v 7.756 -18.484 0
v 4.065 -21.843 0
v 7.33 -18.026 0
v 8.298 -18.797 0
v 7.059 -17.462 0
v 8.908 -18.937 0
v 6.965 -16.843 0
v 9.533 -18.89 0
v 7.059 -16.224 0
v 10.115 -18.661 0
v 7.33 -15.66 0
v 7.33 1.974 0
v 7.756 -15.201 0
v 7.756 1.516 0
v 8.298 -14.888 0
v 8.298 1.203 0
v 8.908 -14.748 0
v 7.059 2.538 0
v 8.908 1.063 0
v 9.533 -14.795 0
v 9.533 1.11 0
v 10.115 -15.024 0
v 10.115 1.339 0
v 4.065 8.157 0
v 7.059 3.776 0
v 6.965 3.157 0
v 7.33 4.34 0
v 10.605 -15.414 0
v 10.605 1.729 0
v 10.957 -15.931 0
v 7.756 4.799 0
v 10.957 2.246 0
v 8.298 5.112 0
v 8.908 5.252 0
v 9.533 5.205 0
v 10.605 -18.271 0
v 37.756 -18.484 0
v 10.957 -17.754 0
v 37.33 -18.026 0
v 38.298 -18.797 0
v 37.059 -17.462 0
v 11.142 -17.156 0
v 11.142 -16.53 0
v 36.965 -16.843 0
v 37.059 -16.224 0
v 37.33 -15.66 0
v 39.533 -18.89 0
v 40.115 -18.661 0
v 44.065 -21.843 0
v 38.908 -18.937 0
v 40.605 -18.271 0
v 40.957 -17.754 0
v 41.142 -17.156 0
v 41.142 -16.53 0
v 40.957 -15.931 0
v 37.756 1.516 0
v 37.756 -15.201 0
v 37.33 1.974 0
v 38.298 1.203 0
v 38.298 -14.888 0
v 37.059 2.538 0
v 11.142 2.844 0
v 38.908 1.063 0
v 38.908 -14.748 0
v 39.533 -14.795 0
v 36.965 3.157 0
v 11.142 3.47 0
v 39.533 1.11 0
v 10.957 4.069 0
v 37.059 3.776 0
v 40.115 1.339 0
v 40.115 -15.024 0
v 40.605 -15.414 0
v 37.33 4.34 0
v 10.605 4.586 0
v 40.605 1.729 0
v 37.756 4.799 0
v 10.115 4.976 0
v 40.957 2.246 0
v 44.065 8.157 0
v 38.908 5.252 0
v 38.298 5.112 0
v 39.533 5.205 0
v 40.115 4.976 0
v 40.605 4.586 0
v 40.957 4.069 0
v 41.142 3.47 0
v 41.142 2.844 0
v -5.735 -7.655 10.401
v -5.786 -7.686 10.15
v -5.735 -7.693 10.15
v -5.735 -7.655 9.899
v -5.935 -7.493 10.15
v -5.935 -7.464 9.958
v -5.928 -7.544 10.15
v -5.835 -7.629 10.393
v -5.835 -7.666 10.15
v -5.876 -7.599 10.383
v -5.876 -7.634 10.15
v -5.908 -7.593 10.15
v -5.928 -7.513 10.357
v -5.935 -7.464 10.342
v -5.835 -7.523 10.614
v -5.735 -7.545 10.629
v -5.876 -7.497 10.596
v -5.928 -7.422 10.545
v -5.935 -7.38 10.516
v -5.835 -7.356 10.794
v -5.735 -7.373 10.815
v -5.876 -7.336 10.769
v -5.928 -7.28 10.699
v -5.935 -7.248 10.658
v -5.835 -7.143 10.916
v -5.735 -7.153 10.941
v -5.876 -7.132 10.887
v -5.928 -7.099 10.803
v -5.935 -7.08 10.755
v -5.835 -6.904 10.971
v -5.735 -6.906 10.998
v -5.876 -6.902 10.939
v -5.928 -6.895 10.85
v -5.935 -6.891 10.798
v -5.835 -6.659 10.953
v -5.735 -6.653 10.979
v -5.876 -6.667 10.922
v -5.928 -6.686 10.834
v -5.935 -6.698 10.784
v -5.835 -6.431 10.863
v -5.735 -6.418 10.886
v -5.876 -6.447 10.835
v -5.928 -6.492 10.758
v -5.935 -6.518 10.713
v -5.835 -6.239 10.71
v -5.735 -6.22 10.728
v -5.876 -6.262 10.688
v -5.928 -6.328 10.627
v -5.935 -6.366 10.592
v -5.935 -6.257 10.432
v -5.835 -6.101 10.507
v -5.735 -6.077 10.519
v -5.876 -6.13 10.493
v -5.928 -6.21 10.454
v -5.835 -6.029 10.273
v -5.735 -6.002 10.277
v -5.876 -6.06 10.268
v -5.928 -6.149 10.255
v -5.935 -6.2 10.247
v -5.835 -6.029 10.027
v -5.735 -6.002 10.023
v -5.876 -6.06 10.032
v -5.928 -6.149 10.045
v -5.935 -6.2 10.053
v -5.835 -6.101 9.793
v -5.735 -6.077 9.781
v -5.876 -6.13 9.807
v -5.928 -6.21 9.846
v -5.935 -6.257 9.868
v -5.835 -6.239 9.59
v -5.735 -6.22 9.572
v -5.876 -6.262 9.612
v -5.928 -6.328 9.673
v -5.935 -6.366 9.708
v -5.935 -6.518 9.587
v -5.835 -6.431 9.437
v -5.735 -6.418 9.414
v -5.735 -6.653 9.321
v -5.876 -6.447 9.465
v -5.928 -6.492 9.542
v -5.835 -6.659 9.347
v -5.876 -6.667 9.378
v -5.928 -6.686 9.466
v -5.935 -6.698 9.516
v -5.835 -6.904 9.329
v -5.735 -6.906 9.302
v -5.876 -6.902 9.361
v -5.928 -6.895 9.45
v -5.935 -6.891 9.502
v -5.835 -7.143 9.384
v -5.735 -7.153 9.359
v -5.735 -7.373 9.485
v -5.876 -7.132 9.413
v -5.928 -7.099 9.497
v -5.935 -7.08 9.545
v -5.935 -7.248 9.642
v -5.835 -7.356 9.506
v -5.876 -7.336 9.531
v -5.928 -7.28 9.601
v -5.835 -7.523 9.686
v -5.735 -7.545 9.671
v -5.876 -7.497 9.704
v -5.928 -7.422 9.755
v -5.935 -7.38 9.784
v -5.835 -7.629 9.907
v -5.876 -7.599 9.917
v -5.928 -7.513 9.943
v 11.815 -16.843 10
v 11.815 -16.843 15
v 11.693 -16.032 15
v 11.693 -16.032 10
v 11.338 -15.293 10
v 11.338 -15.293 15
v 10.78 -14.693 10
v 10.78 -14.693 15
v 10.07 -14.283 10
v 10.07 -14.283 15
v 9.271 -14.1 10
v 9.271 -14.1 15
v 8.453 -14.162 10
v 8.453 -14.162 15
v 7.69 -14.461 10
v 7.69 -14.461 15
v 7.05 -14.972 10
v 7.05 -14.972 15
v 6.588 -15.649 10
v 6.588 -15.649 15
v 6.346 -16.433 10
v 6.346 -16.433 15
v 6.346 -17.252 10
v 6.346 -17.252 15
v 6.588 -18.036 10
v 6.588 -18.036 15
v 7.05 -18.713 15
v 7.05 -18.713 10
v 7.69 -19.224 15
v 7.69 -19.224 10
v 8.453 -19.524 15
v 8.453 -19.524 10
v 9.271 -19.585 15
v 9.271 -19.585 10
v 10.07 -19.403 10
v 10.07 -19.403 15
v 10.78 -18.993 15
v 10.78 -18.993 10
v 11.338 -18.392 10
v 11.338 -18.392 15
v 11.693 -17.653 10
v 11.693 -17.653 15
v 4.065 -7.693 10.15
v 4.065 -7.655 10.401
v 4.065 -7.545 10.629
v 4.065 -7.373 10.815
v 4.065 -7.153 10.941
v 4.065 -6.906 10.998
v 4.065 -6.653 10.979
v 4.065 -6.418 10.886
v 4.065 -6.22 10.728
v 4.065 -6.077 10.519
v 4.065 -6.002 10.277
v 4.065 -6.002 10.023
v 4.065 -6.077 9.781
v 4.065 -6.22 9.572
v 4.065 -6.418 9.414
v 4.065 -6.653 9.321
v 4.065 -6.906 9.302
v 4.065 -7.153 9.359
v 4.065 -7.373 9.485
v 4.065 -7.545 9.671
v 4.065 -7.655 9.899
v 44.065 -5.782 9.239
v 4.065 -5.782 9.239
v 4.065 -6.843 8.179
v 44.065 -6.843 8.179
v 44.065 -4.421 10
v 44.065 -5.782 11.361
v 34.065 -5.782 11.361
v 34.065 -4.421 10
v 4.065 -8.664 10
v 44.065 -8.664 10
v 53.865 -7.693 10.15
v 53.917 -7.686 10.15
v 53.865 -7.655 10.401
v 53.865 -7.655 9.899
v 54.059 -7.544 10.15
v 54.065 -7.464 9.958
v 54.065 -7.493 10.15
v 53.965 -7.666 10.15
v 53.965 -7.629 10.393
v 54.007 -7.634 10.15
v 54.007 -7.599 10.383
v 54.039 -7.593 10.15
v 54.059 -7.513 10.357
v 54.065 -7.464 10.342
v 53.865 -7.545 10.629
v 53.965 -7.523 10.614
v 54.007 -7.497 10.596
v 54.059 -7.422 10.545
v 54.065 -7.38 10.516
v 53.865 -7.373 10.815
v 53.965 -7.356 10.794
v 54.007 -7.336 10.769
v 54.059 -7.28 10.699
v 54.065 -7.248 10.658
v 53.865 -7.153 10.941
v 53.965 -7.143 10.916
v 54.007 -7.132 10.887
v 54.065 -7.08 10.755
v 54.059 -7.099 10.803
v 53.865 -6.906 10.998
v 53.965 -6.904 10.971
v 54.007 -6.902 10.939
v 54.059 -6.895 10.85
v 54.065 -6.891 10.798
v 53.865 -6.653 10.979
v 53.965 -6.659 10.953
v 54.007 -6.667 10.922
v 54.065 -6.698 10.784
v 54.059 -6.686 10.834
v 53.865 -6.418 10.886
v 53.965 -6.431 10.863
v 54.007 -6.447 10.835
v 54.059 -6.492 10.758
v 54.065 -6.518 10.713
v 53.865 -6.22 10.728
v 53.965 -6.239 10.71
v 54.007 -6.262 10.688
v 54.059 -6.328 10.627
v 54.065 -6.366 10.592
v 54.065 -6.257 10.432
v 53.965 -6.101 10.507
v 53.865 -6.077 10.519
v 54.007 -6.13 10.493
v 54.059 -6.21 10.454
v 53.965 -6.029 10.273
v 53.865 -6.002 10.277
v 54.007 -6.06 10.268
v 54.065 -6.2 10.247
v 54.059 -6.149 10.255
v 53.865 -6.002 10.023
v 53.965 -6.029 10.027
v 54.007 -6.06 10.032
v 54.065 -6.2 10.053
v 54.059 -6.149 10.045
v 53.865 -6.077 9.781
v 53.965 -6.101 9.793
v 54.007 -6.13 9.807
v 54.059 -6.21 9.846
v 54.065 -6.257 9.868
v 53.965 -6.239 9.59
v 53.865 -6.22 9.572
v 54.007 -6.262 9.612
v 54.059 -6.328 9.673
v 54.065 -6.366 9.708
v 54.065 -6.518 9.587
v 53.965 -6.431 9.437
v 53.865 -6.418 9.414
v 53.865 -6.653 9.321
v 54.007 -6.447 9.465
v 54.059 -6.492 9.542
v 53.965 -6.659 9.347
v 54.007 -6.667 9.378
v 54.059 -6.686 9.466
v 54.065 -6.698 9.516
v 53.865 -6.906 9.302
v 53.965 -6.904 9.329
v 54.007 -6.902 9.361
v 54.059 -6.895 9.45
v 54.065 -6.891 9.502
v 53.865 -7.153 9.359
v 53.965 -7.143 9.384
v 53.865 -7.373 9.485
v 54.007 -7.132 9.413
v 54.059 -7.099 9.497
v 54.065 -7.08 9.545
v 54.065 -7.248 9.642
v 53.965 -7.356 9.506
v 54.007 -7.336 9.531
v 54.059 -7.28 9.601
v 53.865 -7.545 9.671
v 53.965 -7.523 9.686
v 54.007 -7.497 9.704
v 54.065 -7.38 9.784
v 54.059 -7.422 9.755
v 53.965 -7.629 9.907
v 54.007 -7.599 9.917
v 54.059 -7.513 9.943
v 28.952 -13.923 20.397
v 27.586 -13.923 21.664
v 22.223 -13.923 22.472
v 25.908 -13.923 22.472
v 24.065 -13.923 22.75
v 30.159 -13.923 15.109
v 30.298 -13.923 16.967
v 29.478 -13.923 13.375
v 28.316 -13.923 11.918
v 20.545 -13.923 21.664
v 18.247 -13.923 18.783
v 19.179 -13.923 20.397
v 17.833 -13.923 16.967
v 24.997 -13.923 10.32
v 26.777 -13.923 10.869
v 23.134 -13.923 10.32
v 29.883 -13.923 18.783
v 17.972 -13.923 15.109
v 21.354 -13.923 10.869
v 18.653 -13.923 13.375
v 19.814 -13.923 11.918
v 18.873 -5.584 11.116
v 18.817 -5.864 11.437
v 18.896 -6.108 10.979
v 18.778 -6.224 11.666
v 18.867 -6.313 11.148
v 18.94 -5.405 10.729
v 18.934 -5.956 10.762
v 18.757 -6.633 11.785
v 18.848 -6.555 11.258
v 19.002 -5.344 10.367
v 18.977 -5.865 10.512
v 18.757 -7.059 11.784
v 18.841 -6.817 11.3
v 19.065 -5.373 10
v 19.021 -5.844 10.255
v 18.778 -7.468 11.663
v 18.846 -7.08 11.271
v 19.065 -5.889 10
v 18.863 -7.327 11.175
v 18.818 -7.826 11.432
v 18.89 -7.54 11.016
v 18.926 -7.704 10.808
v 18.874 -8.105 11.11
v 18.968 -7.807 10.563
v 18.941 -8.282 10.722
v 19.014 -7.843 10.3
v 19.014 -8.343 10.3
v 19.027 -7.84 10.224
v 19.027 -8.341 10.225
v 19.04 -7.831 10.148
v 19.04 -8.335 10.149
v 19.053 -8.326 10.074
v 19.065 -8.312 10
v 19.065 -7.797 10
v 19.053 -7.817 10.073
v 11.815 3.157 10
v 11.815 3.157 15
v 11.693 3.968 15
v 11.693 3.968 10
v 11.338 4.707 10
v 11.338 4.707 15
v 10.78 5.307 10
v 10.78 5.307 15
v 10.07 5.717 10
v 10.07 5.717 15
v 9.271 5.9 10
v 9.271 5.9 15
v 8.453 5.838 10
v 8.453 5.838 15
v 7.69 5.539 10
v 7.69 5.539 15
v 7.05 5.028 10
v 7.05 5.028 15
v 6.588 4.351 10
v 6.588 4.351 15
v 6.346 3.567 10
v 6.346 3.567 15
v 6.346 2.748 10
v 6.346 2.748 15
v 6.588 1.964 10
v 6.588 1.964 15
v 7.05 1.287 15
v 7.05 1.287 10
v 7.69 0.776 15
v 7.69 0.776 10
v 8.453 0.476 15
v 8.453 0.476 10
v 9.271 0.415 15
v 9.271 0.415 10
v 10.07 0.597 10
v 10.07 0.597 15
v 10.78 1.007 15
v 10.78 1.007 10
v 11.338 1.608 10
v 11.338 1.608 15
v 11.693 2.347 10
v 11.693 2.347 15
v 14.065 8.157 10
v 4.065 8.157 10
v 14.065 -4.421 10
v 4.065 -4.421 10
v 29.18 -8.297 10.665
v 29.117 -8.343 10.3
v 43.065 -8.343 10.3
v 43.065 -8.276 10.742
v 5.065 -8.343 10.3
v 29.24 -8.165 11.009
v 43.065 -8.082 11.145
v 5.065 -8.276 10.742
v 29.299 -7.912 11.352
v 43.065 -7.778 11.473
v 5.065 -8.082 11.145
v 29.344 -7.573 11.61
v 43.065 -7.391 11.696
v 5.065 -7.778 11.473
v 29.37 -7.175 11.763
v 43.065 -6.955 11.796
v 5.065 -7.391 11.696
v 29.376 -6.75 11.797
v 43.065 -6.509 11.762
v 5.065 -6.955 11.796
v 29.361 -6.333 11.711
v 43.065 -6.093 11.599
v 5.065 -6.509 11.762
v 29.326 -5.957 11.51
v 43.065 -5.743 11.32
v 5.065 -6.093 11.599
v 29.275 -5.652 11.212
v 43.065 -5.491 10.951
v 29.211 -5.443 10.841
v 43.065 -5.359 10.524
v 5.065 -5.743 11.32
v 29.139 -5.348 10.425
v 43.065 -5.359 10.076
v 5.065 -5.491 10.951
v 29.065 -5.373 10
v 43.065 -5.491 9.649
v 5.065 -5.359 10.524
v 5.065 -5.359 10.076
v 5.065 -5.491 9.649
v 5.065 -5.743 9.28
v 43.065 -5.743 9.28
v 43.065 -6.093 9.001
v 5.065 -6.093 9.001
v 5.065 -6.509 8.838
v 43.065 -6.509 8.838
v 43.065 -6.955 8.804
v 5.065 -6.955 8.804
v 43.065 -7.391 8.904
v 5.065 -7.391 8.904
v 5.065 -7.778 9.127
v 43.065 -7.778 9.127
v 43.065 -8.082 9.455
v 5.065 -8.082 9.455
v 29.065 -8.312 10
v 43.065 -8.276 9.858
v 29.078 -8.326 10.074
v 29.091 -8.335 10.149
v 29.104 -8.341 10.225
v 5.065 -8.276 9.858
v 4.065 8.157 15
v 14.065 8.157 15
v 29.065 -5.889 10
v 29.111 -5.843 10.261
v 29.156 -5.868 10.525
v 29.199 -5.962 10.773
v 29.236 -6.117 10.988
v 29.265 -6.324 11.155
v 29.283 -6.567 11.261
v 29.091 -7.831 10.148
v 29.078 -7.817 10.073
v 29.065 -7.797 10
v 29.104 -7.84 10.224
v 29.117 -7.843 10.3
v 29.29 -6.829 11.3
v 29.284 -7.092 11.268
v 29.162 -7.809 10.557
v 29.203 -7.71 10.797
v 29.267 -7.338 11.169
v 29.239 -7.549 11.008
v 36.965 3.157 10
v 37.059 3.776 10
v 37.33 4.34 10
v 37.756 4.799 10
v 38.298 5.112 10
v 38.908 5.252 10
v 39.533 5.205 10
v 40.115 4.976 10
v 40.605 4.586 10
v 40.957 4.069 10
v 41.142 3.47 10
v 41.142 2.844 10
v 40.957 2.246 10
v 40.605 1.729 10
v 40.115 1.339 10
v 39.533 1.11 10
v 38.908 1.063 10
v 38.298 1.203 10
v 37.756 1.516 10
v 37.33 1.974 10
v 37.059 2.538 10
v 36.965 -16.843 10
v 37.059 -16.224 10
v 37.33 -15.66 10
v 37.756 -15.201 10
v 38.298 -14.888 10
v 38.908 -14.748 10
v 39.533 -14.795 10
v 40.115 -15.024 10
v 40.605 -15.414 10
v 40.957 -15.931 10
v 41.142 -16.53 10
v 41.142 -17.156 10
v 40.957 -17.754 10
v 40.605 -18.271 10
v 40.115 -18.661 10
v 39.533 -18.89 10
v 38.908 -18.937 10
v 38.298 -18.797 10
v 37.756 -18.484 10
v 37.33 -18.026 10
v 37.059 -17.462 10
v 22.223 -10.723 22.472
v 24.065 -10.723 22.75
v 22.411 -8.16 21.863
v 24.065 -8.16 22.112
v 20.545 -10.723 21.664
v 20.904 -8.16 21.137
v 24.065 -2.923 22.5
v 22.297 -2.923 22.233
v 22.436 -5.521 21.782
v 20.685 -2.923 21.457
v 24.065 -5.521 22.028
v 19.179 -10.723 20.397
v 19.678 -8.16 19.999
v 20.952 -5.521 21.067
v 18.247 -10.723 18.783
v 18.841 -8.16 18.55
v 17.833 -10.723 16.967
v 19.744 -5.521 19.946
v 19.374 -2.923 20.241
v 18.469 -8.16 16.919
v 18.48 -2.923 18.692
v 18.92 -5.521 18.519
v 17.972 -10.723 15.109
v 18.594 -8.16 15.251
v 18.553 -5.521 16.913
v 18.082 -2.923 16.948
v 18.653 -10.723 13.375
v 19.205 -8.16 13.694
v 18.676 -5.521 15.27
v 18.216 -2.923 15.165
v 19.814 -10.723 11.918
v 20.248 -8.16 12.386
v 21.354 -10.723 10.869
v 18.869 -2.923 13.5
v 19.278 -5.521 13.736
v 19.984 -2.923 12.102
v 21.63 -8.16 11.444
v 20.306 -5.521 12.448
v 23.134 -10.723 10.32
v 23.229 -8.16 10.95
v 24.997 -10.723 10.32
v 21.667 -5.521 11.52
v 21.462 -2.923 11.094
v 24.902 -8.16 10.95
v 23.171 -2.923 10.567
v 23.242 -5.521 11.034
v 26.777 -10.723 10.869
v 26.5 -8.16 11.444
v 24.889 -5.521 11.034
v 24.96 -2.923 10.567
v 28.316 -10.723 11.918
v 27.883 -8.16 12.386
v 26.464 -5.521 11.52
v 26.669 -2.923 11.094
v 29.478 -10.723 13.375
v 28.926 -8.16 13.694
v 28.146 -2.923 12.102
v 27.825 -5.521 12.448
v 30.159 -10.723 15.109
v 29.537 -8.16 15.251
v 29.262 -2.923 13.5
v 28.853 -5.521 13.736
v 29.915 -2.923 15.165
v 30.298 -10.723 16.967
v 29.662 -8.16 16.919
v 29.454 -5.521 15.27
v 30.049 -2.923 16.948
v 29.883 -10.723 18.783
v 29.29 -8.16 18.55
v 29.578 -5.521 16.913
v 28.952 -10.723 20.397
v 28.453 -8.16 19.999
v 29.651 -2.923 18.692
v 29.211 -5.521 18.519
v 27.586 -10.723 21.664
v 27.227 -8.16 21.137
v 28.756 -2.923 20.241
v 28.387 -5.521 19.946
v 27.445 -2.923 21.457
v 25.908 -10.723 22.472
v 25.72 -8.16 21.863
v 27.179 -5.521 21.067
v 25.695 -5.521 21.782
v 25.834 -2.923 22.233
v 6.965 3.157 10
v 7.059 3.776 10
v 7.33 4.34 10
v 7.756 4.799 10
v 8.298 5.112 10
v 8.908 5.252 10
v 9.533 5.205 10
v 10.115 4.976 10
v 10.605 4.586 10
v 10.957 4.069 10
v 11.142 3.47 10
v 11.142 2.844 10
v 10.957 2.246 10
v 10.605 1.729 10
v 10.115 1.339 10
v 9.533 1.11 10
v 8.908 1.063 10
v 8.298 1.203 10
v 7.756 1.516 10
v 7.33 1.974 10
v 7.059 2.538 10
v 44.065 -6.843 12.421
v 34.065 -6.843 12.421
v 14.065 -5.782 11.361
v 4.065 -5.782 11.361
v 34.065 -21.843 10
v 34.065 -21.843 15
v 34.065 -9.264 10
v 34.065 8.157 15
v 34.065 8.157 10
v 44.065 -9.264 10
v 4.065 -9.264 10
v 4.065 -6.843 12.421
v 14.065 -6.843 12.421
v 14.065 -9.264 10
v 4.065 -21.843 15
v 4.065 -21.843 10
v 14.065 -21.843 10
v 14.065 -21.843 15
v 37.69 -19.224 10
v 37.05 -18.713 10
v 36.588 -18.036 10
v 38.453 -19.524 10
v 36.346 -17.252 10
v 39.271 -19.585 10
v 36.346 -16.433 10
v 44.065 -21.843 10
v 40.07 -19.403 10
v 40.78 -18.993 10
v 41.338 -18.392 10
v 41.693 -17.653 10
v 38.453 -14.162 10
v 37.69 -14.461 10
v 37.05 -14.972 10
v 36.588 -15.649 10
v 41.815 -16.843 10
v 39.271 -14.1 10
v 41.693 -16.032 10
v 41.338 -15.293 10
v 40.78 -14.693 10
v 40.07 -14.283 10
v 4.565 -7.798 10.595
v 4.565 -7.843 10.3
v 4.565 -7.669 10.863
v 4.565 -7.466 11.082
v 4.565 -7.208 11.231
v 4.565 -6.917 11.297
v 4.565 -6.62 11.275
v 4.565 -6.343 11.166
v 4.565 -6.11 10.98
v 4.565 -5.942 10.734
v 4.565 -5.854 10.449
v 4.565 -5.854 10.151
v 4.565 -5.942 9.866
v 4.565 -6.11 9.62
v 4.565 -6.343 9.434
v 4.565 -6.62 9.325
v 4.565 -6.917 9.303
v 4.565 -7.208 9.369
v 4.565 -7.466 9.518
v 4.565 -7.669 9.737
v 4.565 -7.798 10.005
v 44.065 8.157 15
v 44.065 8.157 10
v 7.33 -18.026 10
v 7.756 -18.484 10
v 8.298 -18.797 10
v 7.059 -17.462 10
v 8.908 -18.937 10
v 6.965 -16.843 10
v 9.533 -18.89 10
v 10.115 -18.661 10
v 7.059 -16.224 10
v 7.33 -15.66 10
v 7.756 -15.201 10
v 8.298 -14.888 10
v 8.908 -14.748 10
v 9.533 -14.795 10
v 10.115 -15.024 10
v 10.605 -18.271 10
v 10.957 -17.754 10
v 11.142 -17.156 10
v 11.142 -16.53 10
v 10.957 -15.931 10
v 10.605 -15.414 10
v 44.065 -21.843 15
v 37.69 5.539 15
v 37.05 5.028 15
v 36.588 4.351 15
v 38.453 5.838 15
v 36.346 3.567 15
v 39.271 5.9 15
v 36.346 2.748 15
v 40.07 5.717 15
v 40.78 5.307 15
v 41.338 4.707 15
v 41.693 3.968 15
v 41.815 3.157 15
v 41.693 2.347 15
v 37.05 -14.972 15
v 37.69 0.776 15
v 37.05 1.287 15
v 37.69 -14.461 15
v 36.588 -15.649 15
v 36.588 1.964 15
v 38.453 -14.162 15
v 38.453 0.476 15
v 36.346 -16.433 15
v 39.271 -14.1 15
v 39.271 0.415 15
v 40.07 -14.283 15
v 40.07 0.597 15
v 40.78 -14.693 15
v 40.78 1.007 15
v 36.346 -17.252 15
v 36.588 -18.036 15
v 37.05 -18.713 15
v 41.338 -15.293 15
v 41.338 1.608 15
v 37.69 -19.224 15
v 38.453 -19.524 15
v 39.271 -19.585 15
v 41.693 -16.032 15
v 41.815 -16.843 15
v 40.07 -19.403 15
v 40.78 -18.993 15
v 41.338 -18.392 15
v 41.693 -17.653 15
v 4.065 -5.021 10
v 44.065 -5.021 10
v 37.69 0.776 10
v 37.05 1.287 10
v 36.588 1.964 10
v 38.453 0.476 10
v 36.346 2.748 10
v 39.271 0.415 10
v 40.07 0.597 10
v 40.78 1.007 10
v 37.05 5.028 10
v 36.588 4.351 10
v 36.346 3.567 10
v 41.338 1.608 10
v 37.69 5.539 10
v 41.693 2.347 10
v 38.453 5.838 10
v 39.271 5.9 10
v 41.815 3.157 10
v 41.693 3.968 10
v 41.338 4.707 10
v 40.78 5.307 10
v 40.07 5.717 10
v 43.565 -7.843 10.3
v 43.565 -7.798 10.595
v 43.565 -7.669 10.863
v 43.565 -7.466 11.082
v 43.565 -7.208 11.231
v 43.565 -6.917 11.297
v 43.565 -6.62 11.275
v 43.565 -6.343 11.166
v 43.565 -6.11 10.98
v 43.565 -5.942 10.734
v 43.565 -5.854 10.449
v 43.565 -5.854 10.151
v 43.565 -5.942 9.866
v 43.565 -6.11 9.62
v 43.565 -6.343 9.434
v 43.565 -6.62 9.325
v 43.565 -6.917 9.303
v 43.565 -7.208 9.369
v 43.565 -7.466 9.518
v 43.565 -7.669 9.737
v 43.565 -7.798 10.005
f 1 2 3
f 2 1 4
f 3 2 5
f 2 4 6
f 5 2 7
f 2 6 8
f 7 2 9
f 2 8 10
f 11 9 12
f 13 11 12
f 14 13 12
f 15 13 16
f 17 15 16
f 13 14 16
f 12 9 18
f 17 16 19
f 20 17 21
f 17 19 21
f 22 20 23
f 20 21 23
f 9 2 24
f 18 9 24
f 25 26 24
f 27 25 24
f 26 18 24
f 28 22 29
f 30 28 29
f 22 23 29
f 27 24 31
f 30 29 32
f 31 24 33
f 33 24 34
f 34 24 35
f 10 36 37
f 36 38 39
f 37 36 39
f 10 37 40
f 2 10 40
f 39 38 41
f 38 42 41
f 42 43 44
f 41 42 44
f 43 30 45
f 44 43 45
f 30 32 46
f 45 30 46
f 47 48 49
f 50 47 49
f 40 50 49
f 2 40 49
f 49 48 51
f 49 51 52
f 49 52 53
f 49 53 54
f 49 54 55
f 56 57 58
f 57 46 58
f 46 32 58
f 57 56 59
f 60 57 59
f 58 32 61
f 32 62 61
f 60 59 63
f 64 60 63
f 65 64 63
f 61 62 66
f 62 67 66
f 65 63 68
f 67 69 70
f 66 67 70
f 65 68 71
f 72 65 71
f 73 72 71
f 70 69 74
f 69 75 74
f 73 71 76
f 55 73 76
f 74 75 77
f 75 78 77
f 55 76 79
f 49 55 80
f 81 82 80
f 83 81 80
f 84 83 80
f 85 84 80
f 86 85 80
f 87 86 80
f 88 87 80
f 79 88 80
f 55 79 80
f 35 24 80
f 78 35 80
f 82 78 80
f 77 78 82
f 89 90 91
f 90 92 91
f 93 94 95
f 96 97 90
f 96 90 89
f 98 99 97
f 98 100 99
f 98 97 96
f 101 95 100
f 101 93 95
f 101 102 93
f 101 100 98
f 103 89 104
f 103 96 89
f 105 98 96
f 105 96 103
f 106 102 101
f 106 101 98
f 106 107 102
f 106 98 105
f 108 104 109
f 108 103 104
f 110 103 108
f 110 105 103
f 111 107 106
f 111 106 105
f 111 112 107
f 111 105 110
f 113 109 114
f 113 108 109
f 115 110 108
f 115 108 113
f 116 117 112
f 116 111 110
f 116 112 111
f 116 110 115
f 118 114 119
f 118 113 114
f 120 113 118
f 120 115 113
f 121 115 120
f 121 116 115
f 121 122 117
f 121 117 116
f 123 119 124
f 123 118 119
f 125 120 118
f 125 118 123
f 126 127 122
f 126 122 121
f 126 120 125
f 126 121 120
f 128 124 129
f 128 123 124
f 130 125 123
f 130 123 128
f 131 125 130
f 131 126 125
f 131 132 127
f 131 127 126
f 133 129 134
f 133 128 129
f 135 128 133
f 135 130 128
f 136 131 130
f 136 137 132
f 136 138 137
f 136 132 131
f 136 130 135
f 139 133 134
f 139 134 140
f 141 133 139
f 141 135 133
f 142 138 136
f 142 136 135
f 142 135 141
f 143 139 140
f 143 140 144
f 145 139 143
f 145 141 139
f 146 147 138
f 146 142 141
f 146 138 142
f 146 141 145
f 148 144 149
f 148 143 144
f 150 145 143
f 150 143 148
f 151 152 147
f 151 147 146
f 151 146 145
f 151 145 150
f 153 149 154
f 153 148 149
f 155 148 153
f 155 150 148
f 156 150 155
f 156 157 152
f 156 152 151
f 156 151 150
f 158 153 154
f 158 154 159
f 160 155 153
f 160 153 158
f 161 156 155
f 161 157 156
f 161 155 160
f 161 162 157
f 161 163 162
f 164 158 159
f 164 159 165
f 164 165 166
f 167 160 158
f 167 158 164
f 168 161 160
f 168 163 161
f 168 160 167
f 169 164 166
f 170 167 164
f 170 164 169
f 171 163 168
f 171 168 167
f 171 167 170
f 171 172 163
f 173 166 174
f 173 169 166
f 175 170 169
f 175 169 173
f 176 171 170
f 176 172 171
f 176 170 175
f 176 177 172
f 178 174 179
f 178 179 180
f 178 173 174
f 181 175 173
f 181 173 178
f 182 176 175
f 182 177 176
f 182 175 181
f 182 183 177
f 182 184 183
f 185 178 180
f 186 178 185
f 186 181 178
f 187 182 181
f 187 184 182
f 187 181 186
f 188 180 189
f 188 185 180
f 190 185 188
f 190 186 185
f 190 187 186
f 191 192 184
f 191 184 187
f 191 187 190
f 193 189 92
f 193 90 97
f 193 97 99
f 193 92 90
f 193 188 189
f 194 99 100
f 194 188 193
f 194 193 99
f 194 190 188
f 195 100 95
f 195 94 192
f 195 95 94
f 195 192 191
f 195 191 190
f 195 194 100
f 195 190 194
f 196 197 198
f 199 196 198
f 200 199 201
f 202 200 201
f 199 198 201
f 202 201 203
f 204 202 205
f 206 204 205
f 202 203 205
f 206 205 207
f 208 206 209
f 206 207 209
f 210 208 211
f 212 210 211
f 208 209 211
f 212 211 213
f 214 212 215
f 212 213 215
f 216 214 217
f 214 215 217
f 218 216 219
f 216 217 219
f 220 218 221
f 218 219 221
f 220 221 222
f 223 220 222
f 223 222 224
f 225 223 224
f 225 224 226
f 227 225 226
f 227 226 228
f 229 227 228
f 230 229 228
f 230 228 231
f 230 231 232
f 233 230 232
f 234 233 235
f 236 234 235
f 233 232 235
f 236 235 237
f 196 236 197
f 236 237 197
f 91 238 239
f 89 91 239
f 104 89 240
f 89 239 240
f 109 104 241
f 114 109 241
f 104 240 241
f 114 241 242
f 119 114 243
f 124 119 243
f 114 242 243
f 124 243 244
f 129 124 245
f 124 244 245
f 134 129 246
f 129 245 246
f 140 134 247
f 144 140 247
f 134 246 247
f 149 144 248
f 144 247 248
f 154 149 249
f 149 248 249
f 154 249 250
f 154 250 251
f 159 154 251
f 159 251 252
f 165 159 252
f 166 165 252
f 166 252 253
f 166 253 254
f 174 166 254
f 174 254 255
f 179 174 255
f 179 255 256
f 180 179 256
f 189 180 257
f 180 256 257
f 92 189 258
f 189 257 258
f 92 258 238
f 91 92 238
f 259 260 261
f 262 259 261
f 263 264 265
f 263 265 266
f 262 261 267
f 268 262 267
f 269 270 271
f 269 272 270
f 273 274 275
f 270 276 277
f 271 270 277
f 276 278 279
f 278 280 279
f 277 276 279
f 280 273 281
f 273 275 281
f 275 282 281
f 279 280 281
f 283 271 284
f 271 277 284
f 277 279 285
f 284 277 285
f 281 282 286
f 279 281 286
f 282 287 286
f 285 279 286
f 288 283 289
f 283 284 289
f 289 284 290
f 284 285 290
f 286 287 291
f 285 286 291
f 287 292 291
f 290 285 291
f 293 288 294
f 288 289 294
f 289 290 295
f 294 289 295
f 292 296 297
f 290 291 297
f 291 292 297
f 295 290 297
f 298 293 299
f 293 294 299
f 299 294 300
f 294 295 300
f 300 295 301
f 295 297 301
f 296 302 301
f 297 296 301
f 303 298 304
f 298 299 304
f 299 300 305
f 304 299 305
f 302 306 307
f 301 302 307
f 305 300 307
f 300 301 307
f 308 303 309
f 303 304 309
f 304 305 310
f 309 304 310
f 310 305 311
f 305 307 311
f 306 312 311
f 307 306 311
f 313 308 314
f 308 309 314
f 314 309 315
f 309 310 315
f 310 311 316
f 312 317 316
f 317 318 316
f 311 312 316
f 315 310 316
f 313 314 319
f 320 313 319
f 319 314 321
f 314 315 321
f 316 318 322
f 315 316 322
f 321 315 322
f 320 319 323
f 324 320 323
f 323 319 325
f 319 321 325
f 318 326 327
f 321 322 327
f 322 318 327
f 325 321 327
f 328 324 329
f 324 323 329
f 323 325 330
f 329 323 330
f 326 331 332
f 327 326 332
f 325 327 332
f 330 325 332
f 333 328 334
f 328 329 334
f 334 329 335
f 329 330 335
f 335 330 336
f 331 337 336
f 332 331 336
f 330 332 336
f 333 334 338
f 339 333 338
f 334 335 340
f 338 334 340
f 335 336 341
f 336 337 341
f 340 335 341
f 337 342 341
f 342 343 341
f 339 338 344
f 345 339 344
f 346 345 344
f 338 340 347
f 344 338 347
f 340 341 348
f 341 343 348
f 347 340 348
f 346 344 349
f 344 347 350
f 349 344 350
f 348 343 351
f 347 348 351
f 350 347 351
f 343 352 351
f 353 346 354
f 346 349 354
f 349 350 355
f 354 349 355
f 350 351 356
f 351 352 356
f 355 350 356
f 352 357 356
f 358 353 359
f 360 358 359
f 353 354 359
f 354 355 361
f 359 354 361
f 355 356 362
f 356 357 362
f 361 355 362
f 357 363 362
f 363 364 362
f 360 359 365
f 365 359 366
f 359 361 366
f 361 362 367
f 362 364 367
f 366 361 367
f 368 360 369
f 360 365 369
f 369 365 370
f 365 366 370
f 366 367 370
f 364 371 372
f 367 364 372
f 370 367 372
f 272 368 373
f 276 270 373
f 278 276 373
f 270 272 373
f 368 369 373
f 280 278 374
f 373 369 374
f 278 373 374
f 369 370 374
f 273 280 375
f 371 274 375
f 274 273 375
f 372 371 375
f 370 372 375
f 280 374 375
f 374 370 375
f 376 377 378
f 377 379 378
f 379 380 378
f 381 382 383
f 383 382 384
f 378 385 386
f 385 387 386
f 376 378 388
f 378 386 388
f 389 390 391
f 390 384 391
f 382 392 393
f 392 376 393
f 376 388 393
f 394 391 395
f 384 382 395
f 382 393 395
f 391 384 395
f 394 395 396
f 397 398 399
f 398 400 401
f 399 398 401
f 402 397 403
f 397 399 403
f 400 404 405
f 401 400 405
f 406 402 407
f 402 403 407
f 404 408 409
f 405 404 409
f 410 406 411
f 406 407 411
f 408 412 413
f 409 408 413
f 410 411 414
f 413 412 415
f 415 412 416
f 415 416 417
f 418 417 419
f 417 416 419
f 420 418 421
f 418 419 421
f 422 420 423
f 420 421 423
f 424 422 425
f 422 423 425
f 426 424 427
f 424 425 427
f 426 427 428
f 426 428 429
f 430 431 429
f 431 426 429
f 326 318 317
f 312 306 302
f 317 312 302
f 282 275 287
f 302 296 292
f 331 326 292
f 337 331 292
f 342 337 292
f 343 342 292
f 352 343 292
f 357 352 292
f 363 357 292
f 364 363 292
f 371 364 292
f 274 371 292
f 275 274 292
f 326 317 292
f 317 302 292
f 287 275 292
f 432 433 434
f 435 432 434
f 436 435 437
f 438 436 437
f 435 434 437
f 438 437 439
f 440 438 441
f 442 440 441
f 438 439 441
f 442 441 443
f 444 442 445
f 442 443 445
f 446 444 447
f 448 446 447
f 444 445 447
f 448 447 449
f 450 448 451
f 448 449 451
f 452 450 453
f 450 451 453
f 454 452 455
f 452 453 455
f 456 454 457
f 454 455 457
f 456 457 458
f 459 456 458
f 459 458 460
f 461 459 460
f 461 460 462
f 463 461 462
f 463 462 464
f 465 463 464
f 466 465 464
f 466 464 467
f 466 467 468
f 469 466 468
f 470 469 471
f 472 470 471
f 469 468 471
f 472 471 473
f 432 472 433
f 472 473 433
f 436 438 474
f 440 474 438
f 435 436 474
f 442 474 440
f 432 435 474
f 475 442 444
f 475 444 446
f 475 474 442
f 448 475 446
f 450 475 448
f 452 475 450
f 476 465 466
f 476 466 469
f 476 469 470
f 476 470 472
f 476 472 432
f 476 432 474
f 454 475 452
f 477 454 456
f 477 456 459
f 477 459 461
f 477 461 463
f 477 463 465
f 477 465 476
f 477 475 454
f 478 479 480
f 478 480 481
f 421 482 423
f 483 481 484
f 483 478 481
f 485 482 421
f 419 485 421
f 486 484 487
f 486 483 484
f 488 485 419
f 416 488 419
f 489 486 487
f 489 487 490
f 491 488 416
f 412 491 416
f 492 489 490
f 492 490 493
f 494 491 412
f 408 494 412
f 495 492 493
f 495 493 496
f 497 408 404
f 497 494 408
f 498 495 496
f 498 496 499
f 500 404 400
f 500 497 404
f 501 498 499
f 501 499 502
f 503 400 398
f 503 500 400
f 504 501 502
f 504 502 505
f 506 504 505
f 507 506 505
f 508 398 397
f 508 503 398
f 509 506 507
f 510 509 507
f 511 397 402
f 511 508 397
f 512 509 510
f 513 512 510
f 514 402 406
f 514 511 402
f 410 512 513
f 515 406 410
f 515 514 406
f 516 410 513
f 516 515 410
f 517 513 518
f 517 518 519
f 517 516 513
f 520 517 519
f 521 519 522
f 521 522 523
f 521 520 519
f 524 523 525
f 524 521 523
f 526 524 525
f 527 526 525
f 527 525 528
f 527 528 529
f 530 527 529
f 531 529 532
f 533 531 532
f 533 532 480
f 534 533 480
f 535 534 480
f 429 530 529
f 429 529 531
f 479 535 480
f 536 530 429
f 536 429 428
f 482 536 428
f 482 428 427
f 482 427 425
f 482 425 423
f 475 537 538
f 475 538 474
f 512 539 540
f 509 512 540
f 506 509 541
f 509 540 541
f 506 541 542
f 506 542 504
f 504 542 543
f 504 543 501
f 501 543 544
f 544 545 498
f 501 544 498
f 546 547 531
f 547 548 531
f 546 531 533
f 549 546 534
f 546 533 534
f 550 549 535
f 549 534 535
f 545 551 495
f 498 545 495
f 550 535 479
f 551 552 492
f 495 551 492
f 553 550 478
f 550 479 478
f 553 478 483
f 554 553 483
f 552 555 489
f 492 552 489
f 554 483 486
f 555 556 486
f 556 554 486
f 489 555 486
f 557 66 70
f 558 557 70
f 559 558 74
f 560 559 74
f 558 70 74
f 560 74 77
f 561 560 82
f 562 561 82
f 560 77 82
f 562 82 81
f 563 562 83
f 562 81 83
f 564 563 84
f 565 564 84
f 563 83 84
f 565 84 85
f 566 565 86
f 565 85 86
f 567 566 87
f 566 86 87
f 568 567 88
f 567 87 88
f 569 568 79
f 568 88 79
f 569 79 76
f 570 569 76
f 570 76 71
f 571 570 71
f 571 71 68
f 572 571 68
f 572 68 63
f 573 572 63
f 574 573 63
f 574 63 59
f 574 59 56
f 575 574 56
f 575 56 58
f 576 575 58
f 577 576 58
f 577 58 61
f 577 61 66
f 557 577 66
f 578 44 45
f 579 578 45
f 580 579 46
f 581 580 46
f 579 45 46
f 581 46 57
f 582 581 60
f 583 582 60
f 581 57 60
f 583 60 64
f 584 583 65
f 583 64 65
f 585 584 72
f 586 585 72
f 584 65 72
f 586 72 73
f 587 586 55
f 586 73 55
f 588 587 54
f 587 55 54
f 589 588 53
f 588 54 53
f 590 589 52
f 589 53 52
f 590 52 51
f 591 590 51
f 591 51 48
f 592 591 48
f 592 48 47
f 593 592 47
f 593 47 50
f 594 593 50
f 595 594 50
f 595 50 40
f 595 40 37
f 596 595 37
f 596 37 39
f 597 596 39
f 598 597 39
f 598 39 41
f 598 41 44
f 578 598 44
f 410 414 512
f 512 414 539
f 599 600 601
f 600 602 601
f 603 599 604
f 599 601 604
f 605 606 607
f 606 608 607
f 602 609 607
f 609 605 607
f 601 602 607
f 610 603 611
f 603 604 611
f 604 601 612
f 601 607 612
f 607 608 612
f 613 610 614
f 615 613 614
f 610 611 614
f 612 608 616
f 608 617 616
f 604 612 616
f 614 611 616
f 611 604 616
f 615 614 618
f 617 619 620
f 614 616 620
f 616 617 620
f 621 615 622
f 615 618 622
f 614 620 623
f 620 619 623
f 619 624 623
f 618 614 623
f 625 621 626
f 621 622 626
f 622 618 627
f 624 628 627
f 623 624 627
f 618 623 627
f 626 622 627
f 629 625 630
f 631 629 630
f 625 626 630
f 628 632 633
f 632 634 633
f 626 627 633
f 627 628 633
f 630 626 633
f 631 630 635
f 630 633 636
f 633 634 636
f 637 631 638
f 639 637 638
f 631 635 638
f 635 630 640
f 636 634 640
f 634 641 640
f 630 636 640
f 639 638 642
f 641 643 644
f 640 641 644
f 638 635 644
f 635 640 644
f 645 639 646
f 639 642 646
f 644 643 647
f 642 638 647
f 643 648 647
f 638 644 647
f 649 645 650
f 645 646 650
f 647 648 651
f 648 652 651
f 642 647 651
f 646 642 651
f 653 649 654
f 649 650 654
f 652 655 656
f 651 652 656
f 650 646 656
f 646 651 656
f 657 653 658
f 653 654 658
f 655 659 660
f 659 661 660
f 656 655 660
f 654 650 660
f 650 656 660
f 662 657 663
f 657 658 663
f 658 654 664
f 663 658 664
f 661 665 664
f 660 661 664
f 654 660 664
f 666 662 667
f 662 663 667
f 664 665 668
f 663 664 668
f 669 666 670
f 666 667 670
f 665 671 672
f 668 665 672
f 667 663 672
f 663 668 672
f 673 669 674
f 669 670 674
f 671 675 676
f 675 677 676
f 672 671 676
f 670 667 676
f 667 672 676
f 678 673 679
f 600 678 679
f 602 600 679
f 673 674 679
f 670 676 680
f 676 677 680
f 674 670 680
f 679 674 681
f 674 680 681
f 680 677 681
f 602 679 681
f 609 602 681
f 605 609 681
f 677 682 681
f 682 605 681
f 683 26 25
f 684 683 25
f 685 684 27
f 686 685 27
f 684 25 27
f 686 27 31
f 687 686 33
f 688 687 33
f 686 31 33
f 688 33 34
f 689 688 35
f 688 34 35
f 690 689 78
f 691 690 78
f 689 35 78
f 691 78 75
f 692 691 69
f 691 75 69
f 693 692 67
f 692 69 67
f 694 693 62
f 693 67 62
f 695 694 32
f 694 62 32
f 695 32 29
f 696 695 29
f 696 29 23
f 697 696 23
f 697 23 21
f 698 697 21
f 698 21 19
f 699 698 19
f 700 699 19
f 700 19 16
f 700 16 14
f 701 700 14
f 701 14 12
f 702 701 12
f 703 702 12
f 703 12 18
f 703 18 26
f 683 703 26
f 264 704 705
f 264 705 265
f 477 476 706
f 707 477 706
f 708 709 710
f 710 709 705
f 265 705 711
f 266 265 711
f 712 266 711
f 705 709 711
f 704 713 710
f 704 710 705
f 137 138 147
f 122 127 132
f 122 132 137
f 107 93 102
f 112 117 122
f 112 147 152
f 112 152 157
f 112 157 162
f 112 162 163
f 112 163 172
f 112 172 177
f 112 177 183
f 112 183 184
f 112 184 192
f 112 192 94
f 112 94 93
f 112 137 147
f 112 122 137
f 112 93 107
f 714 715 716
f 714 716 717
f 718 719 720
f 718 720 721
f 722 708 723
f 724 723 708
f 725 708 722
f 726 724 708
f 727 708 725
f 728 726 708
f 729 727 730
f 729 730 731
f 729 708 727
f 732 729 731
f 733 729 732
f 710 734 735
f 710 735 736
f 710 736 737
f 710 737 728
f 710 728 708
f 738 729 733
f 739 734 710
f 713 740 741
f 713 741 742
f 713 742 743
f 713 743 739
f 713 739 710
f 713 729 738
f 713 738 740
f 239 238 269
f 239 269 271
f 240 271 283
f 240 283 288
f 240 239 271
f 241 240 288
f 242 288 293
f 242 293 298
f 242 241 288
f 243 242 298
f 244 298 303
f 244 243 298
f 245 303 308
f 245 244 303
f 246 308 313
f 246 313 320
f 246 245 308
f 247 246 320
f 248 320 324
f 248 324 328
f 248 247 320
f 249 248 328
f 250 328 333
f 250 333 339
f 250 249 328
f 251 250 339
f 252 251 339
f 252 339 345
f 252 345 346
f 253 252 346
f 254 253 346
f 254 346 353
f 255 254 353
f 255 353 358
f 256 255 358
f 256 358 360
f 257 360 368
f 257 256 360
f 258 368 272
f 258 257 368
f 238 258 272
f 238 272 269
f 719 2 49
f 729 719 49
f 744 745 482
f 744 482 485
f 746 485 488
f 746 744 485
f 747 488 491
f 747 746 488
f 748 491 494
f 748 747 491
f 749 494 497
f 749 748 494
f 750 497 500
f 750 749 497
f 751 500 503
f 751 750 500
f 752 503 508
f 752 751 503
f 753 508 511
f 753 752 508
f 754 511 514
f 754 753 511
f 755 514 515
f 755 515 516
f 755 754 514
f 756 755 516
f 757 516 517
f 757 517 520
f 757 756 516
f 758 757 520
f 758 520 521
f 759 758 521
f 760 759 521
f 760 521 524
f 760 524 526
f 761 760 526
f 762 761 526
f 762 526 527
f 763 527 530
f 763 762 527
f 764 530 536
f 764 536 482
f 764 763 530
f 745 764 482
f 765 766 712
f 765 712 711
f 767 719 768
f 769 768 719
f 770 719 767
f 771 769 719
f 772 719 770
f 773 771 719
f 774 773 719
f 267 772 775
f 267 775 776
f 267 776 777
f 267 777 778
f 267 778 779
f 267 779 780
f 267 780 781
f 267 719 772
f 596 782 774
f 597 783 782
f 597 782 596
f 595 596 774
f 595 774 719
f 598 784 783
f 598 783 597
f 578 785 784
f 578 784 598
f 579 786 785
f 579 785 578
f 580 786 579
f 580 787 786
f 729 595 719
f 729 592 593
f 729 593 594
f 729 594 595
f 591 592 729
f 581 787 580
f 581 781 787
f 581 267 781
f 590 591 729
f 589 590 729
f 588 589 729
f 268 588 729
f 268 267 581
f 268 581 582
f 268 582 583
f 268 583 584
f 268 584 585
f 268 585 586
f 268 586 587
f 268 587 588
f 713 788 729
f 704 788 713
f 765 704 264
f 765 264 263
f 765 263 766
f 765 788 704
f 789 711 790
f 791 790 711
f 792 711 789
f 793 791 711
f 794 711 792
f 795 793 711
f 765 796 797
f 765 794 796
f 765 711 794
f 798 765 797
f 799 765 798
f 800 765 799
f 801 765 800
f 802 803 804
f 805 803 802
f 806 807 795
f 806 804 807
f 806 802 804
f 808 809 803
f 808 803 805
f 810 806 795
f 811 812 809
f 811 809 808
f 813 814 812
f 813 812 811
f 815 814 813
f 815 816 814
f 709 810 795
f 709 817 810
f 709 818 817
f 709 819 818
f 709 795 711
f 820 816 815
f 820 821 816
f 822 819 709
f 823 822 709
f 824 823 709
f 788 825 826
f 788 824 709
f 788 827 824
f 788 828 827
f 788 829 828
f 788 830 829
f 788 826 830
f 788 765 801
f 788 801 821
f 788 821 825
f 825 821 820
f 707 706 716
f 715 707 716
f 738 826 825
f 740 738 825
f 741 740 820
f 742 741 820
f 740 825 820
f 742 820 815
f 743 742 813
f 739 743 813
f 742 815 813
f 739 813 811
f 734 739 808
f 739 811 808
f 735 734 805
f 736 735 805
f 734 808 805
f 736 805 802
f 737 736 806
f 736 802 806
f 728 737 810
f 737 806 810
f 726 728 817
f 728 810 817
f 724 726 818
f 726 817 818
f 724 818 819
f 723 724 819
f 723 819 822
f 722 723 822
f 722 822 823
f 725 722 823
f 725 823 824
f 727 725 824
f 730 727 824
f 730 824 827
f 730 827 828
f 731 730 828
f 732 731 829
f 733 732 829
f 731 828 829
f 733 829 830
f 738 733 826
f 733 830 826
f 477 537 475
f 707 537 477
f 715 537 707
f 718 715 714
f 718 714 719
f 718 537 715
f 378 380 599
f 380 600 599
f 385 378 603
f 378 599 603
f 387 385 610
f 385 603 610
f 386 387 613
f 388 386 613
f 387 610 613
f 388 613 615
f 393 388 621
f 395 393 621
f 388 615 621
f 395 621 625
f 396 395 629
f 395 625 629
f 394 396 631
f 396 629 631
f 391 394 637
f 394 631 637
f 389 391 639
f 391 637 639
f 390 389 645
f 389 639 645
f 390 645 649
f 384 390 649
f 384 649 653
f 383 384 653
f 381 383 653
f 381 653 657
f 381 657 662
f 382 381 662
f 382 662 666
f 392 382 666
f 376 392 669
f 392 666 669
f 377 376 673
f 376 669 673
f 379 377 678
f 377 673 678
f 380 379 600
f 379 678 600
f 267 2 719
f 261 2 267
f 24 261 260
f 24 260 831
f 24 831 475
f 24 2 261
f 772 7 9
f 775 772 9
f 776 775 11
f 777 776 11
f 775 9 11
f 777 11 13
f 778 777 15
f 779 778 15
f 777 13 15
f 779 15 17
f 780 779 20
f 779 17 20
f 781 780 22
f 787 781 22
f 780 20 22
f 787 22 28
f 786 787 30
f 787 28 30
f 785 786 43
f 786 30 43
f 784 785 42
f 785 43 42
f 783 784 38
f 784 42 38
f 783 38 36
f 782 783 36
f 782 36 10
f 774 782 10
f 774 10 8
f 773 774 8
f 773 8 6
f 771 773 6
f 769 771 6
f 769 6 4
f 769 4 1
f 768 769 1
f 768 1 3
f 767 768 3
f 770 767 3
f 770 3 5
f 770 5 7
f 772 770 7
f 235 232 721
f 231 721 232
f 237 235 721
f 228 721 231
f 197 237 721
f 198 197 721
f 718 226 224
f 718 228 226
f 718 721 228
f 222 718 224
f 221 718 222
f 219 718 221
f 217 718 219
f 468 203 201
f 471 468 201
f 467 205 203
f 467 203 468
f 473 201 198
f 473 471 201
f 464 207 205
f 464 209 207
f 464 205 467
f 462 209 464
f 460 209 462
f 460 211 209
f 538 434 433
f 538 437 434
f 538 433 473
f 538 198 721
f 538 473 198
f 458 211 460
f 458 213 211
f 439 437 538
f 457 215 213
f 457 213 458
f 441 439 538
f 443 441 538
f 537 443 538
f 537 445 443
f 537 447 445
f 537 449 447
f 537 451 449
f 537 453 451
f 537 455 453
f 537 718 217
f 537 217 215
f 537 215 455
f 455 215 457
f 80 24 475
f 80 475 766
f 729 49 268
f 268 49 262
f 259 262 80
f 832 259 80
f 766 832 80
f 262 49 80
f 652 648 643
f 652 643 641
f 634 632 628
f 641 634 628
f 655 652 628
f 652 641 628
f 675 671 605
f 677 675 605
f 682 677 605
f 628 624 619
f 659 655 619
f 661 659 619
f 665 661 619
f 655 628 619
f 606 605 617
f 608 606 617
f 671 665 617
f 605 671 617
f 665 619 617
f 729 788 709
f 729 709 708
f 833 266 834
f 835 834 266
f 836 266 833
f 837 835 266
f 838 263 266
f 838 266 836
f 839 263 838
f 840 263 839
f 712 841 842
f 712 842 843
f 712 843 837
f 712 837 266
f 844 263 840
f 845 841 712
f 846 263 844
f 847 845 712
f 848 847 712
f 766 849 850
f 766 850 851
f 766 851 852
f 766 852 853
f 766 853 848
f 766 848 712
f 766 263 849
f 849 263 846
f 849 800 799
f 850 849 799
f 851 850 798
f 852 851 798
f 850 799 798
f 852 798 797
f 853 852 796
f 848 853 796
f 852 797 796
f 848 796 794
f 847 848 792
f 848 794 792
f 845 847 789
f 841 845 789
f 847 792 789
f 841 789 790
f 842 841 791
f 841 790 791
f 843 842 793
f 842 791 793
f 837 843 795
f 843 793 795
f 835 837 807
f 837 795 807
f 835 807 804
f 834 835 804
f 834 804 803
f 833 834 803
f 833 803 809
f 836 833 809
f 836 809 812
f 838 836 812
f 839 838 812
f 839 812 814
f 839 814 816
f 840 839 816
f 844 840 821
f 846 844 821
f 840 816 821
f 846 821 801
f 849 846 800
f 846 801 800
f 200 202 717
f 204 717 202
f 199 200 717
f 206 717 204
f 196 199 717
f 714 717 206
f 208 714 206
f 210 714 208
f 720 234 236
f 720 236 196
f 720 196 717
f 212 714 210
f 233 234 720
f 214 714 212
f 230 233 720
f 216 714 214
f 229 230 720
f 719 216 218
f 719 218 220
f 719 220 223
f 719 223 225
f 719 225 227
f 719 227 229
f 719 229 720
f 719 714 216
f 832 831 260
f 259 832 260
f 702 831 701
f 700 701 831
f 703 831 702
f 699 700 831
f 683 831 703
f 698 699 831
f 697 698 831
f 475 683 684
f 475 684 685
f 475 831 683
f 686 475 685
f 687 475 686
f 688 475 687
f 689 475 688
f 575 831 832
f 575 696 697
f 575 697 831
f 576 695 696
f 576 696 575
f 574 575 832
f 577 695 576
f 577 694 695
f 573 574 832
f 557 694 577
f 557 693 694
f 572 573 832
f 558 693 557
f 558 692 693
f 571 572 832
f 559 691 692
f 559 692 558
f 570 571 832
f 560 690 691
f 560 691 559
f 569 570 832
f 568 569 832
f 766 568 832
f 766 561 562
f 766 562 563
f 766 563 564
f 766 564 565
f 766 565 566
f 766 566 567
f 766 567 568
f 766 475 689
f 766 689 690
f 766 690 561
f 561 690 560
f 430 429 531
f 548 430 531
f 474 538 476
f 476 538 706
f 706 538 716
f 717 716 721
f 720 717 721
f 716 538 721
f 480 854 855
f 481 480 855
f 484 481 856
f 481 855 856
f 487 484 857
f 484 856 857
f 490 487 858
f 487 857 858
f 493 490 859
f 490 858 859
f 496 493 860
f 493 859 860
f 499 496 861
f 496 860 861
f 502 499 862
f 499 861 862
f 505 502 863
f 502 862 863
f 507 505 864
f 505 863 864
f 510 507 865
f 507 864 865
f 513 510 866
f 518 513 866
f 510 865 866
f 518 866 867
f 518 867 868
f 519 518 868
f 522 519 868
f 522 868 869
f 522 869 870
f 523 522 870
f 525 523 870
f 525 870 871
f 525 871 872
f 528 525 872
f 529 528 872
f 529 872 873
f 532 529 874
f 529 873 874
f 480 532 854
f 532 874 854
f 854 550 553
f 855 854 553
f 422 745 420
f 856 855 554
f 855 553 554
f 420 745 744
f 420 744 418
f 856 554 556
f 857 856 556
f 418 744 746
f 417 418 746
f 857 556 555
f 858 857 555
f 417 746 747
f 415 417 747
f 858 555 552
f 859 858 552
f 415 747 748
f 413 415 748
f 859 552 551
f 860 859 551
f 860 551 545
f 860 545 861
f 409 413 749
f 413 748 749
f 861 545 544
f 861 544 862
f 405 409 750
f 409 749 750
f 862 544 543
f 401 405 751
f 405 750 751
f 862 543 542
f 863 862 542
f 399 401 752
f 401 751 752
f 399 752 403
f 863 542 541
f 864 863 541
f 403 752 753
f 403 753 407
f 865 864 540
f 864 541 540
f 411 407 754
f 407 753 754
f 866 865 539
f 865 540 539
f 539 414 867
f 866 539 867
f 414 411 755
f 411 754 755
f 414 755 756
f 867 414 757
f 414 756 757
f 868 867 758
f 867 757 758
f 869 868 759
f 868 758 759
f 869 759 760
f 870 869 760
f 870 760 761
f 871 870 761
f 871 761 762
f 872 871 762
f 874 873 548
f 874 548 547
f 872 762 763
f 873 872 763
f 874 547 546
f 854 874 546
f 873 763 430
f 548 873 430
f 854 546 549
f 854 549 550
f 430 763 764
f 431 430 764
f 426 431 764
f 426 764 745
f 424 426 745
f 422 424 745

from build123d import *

# Parameters (mm, degrees)
F0_W      = 40
F0_H      = 30
F1_DEPTH  = 10
F4_DEPTH  = 40
F5_D      = 4.2
F7_DEPTH  = 10
F9_DEPTH  = 10
F10_R     = 2.75
F11_DEPTH = 5
F12_R     = 2.75
F13_DEPTH = 5
F15_R     = 1.5
F15_R_2   = 1
F16_DEPTH = 40
F17_W     = 10
F17_H     = 5.7902427018
F18_DEPTH = 25
F20_R     = 0.85
F21_DEPTH = 50
F22_DEPTH = 10
F26_R     = 0.2


# Not quite as in the source:
# - a fillet or chamfer that OpenCascade refuses, or shapes differently, is made with other operations: its cross-section is extruded or revolved along the edge and cut away or added


with BuildPart() as f1:
    # F0 (on Top) → F1 (new body)
    with BuildSketch(Plane.XY):
        with Locations((24.0654195845, -6.8426200747)):
            Rectangle(F0_W, F0_H)
    extrude(amount=F1_DEPTH)

    # F3 (on face) → F4 (cut, through all)
    with BuildSketch(Plane(origin=(4.0654195845, 0, 0), x_dir=(0, -1, 0), z_dir=(-1, 0, 0))):
        with BuildLine():
            ThreePointArc((7.9032802465, 9.2393398282), (6.8426200747, 8.8), (5.781959903, 9.2393398282))
            Line((5.781959903, 9.2393398282), (6.8426200747, 8.1786796564))
            Line((6.8426200747, 8.1786796564), (7.9032802465, 9.2393398282))
        make_face()
        with BuildLine():
            ThreePointArc((5.3729262291, 10), (5.5215130247, 9.5895943677), (5.781959903, 9.2393398282))
            ThreePointArc((5.781959903, 9.2393398282), (6.8426200747, 8.8), (7.9032802465, 9.2393398282))
            ThreePointArc((7.9032802465, 9.2393398282), (8.1637271248, 9.5895943677), (8.3123139204, 10))
            Line((8.3123139204, 10), (6.8426200747, 10))
            Line((6.8426200747, 10), (5.3729262291, 10))
        make_face()
        with BuildLine():
            Line((5.3729262291, 10), (5.0212997312, 10))
            Line((5.0212997312, 10), (5.781959903, 9.2393398282))
            ThreePointArc((5.781959903, 9.2393398282), (5.5215130247, 9.5895943677), (5.3729262291, 10))
        make_face()
        with BuildLine():
            ThreePointArc((8.3123139204, 10), (8.1637271248, 9.5895943677), (7.9032802465, 9.2393398282))
            Line((7.9032802465, 9.2393398282), (8.6639404183, 10))
            Line((8.6639404183, 10), (8.3123139204, 10))
        make_face()
    extrude(amount=-F4_DEPTH, mode=Mode.SUBTRACT)

    # F5 (through all)
    with Locations(Plane.XY.offset(10)):
        with Locations((9.0654195845, 3.1573799253), (39.0654195845, 3.1573799253), (39.0654195845, -16.8426200747), (9.0654195845, -16.8426200747)):
            Hole(F5_D / 2)


with BuildPart() as f7:
    # F6 (on face) → F7 (new body)
    with BuildSketch(Plane(origin=(4.0654195845, 0, 0), x_dir=(0, -1, 0), z_dir=(-1, 0, 0))):
        Polygon((-8.1573799253, 15), (-8.1573799253, 10), (4.4212997312, 10), (5.781959903, 11.3606601718), (6.8426200747, 12.4213203436), (7.9032802476, 11.3606601707), (9.2639404183, 10), (21.8426200747, 10), (21.8426200747, 15), align=None)
    extrude(amount=-F7_DEPTH)

    # F10 (on face) → F11 (cut, through all)
    with BuildSketch(Plane.XY.offset(15)):
        with Locations((9.0654195845, 3.1573799253)):
            Circle(F10_R)
        with Locations((9.0654195845, -16.8426200747)):
            Circle(F10_R)
    extrude(amount=-F11_DEPTH, mode=Mode.SUBTRACT)


with BuildPart() as f9:
    # F8 (on face) → F9 (new body)
    with BuildSketch(Plane.YZ.offset(44.0654195845)):
        Polygon((-6.8426200747, 12.4213203436), (-5.781959903, 11.3606601718), (-4.4212997312, 10), (8.1573799253, 10), (8.1573799253, 15), (-21.8426200747, 15), (-21.8426200747, 10), (-9.2639404183, 10), (-7.9032802476, 11.3606601707), align=None)
    extrude(amount=-F9_DEPTH)

    # F12 (on face) → F13 (cut, through all)
    with BuildSketch(Plane.XY.offset(15)):
        with Locations((39.0654195845, 3.1573799253)):
            Circle(F12_R)
        with Locations((39.0654195845, -16.8426200747)):
            Circle(F12_R)
    extrude(amount=-F13_DEPTH, mode=Mode.SUBTRACT)


with BuildPart() as f16:
    # F15 (on offset) → F16 (new body)
    with BuildSketch(Plane(origin=(4.0654195845, 0, 0), x_dir=(0, -1, 0), z_dir=(-1, 0, 0))):
        with Locations((6.8426200747, 10.3)):
            Circle(F15_R)
        with Locations((6.8426200747, 10.3)):
            Circle(F15_R_2, mode=Mode.SUBTRACT)
    extrude(amount=-F16_DEPTH)

    # F17 (on face) → F18 (cut)
    with BuildSketch(Plane.XZ.offset(21.8426200747)):
        with Locations((24.0654195845, 12.8951213509)):
            Rectangle(F17_W, F17_H)
        Polygon((19.0654195845, 10), (19.0654195845, 15.7902427018), (18.0654195845, 15.7902427018), align=None)
        Polygon((30.0654195845, 15.7902427018), (29.0654195845, 15.7902427018), (29.0654195845, 10), align=None)
    extrude(amount=-F18_DEPTH, mode=Mode.SUBTRACT)

    # F19: chamfer of 1 on 2 edges, made by hand

    # F19_s1 → F19_t2 (revolve, cut)
    with BuildSketch(Plane.XY.offset(10.3)):
        Polygon((5.0654195845, -8.3426200747), (4.0654195845, -7.3426200747), (4.0654195845, -8.3426200747), align=None)
    revolve(axis=Axis((4.0654195845, -6.8426200747, 10.3), (-1, 0, 0)), mode=Mode.SUBTRACT)

    # F19_s3 → F19_t4 (revolve, cut)
    with BuildSketch(Plane.XY.offset(10.3)):
        Polygon((43.0654195845, -8.3426200747), (44.0654195845, -7.3426200747), (44.0654195845, -8.3426200747), align=None)
    revolve(axis=Axis((44.0654195845, -6.8426200747, 10.3), (-1, 0, 0)), mode=Mode.SUBTRACT)


with BuildPart() as f21:
    # F20 (on offset) → F21 (new body)
    with BuildSketch(Plane(origin=(4.0654195845, 0, 0), x_dir=(0, -1, 0), z_dir=(-1, 0, 0))):
        with Locations((6.8426200747, 10.15)):
            Circle(F20_R)
    extrude(amount=-F21_DEPTH)

    # F22 (add): a face of the model
    f22_faces = [f21.faces().sort_by_distance(p)[0] for p in [
        (4.0654195845, -6.8426200747, 10.15),
    ]]
    extrude(f22_faces, amount=F22_DEPTH)

    # F26
    f26_edges = [f21.edges().sort_by_distance(p)[0] for p in [
        (-5.93458, -5.99262, 10.15),
        (54.06542, -5.99262, 10.15),
    ]]
    fillet(f26_edges, radius=F26_R)


with BuildPart() as f25:
    # F24 (on offset) → F25 (revolve)
    with BuildSketch(Plane(origin=(24.0654195845, 0, 0), x_dir=(0, -1, 0), z_dir=(-1, 0, 0))):
        with BuildLine():
            Line((13.9225880235, 16.5), (13.9225880235, 22.75))
            Line((13.9225880235, 22.75), (10.7225880235, 22.75))
            ThreePointArc((10.7225880235, 22.75), (6.8426200747, 22), (2.9225880235, 22.5))
            Line((2.9225880235, 22.5), (2.9225880235, 21.7202004913))
            Line((2.9225880235, 21.7202004913), (2.9225880235, 16.5))
            Line((2.9225880235, 16.5), (13.9225880235, 16.5))
        make_face()
    revolve(axis=Axis((24.0654195845, -8.4225880235, 16.5), (0, -1, 0)))


solid = Compound([f1.part, f7.part, f9.part, f16.part, f21.part, f25.part])
